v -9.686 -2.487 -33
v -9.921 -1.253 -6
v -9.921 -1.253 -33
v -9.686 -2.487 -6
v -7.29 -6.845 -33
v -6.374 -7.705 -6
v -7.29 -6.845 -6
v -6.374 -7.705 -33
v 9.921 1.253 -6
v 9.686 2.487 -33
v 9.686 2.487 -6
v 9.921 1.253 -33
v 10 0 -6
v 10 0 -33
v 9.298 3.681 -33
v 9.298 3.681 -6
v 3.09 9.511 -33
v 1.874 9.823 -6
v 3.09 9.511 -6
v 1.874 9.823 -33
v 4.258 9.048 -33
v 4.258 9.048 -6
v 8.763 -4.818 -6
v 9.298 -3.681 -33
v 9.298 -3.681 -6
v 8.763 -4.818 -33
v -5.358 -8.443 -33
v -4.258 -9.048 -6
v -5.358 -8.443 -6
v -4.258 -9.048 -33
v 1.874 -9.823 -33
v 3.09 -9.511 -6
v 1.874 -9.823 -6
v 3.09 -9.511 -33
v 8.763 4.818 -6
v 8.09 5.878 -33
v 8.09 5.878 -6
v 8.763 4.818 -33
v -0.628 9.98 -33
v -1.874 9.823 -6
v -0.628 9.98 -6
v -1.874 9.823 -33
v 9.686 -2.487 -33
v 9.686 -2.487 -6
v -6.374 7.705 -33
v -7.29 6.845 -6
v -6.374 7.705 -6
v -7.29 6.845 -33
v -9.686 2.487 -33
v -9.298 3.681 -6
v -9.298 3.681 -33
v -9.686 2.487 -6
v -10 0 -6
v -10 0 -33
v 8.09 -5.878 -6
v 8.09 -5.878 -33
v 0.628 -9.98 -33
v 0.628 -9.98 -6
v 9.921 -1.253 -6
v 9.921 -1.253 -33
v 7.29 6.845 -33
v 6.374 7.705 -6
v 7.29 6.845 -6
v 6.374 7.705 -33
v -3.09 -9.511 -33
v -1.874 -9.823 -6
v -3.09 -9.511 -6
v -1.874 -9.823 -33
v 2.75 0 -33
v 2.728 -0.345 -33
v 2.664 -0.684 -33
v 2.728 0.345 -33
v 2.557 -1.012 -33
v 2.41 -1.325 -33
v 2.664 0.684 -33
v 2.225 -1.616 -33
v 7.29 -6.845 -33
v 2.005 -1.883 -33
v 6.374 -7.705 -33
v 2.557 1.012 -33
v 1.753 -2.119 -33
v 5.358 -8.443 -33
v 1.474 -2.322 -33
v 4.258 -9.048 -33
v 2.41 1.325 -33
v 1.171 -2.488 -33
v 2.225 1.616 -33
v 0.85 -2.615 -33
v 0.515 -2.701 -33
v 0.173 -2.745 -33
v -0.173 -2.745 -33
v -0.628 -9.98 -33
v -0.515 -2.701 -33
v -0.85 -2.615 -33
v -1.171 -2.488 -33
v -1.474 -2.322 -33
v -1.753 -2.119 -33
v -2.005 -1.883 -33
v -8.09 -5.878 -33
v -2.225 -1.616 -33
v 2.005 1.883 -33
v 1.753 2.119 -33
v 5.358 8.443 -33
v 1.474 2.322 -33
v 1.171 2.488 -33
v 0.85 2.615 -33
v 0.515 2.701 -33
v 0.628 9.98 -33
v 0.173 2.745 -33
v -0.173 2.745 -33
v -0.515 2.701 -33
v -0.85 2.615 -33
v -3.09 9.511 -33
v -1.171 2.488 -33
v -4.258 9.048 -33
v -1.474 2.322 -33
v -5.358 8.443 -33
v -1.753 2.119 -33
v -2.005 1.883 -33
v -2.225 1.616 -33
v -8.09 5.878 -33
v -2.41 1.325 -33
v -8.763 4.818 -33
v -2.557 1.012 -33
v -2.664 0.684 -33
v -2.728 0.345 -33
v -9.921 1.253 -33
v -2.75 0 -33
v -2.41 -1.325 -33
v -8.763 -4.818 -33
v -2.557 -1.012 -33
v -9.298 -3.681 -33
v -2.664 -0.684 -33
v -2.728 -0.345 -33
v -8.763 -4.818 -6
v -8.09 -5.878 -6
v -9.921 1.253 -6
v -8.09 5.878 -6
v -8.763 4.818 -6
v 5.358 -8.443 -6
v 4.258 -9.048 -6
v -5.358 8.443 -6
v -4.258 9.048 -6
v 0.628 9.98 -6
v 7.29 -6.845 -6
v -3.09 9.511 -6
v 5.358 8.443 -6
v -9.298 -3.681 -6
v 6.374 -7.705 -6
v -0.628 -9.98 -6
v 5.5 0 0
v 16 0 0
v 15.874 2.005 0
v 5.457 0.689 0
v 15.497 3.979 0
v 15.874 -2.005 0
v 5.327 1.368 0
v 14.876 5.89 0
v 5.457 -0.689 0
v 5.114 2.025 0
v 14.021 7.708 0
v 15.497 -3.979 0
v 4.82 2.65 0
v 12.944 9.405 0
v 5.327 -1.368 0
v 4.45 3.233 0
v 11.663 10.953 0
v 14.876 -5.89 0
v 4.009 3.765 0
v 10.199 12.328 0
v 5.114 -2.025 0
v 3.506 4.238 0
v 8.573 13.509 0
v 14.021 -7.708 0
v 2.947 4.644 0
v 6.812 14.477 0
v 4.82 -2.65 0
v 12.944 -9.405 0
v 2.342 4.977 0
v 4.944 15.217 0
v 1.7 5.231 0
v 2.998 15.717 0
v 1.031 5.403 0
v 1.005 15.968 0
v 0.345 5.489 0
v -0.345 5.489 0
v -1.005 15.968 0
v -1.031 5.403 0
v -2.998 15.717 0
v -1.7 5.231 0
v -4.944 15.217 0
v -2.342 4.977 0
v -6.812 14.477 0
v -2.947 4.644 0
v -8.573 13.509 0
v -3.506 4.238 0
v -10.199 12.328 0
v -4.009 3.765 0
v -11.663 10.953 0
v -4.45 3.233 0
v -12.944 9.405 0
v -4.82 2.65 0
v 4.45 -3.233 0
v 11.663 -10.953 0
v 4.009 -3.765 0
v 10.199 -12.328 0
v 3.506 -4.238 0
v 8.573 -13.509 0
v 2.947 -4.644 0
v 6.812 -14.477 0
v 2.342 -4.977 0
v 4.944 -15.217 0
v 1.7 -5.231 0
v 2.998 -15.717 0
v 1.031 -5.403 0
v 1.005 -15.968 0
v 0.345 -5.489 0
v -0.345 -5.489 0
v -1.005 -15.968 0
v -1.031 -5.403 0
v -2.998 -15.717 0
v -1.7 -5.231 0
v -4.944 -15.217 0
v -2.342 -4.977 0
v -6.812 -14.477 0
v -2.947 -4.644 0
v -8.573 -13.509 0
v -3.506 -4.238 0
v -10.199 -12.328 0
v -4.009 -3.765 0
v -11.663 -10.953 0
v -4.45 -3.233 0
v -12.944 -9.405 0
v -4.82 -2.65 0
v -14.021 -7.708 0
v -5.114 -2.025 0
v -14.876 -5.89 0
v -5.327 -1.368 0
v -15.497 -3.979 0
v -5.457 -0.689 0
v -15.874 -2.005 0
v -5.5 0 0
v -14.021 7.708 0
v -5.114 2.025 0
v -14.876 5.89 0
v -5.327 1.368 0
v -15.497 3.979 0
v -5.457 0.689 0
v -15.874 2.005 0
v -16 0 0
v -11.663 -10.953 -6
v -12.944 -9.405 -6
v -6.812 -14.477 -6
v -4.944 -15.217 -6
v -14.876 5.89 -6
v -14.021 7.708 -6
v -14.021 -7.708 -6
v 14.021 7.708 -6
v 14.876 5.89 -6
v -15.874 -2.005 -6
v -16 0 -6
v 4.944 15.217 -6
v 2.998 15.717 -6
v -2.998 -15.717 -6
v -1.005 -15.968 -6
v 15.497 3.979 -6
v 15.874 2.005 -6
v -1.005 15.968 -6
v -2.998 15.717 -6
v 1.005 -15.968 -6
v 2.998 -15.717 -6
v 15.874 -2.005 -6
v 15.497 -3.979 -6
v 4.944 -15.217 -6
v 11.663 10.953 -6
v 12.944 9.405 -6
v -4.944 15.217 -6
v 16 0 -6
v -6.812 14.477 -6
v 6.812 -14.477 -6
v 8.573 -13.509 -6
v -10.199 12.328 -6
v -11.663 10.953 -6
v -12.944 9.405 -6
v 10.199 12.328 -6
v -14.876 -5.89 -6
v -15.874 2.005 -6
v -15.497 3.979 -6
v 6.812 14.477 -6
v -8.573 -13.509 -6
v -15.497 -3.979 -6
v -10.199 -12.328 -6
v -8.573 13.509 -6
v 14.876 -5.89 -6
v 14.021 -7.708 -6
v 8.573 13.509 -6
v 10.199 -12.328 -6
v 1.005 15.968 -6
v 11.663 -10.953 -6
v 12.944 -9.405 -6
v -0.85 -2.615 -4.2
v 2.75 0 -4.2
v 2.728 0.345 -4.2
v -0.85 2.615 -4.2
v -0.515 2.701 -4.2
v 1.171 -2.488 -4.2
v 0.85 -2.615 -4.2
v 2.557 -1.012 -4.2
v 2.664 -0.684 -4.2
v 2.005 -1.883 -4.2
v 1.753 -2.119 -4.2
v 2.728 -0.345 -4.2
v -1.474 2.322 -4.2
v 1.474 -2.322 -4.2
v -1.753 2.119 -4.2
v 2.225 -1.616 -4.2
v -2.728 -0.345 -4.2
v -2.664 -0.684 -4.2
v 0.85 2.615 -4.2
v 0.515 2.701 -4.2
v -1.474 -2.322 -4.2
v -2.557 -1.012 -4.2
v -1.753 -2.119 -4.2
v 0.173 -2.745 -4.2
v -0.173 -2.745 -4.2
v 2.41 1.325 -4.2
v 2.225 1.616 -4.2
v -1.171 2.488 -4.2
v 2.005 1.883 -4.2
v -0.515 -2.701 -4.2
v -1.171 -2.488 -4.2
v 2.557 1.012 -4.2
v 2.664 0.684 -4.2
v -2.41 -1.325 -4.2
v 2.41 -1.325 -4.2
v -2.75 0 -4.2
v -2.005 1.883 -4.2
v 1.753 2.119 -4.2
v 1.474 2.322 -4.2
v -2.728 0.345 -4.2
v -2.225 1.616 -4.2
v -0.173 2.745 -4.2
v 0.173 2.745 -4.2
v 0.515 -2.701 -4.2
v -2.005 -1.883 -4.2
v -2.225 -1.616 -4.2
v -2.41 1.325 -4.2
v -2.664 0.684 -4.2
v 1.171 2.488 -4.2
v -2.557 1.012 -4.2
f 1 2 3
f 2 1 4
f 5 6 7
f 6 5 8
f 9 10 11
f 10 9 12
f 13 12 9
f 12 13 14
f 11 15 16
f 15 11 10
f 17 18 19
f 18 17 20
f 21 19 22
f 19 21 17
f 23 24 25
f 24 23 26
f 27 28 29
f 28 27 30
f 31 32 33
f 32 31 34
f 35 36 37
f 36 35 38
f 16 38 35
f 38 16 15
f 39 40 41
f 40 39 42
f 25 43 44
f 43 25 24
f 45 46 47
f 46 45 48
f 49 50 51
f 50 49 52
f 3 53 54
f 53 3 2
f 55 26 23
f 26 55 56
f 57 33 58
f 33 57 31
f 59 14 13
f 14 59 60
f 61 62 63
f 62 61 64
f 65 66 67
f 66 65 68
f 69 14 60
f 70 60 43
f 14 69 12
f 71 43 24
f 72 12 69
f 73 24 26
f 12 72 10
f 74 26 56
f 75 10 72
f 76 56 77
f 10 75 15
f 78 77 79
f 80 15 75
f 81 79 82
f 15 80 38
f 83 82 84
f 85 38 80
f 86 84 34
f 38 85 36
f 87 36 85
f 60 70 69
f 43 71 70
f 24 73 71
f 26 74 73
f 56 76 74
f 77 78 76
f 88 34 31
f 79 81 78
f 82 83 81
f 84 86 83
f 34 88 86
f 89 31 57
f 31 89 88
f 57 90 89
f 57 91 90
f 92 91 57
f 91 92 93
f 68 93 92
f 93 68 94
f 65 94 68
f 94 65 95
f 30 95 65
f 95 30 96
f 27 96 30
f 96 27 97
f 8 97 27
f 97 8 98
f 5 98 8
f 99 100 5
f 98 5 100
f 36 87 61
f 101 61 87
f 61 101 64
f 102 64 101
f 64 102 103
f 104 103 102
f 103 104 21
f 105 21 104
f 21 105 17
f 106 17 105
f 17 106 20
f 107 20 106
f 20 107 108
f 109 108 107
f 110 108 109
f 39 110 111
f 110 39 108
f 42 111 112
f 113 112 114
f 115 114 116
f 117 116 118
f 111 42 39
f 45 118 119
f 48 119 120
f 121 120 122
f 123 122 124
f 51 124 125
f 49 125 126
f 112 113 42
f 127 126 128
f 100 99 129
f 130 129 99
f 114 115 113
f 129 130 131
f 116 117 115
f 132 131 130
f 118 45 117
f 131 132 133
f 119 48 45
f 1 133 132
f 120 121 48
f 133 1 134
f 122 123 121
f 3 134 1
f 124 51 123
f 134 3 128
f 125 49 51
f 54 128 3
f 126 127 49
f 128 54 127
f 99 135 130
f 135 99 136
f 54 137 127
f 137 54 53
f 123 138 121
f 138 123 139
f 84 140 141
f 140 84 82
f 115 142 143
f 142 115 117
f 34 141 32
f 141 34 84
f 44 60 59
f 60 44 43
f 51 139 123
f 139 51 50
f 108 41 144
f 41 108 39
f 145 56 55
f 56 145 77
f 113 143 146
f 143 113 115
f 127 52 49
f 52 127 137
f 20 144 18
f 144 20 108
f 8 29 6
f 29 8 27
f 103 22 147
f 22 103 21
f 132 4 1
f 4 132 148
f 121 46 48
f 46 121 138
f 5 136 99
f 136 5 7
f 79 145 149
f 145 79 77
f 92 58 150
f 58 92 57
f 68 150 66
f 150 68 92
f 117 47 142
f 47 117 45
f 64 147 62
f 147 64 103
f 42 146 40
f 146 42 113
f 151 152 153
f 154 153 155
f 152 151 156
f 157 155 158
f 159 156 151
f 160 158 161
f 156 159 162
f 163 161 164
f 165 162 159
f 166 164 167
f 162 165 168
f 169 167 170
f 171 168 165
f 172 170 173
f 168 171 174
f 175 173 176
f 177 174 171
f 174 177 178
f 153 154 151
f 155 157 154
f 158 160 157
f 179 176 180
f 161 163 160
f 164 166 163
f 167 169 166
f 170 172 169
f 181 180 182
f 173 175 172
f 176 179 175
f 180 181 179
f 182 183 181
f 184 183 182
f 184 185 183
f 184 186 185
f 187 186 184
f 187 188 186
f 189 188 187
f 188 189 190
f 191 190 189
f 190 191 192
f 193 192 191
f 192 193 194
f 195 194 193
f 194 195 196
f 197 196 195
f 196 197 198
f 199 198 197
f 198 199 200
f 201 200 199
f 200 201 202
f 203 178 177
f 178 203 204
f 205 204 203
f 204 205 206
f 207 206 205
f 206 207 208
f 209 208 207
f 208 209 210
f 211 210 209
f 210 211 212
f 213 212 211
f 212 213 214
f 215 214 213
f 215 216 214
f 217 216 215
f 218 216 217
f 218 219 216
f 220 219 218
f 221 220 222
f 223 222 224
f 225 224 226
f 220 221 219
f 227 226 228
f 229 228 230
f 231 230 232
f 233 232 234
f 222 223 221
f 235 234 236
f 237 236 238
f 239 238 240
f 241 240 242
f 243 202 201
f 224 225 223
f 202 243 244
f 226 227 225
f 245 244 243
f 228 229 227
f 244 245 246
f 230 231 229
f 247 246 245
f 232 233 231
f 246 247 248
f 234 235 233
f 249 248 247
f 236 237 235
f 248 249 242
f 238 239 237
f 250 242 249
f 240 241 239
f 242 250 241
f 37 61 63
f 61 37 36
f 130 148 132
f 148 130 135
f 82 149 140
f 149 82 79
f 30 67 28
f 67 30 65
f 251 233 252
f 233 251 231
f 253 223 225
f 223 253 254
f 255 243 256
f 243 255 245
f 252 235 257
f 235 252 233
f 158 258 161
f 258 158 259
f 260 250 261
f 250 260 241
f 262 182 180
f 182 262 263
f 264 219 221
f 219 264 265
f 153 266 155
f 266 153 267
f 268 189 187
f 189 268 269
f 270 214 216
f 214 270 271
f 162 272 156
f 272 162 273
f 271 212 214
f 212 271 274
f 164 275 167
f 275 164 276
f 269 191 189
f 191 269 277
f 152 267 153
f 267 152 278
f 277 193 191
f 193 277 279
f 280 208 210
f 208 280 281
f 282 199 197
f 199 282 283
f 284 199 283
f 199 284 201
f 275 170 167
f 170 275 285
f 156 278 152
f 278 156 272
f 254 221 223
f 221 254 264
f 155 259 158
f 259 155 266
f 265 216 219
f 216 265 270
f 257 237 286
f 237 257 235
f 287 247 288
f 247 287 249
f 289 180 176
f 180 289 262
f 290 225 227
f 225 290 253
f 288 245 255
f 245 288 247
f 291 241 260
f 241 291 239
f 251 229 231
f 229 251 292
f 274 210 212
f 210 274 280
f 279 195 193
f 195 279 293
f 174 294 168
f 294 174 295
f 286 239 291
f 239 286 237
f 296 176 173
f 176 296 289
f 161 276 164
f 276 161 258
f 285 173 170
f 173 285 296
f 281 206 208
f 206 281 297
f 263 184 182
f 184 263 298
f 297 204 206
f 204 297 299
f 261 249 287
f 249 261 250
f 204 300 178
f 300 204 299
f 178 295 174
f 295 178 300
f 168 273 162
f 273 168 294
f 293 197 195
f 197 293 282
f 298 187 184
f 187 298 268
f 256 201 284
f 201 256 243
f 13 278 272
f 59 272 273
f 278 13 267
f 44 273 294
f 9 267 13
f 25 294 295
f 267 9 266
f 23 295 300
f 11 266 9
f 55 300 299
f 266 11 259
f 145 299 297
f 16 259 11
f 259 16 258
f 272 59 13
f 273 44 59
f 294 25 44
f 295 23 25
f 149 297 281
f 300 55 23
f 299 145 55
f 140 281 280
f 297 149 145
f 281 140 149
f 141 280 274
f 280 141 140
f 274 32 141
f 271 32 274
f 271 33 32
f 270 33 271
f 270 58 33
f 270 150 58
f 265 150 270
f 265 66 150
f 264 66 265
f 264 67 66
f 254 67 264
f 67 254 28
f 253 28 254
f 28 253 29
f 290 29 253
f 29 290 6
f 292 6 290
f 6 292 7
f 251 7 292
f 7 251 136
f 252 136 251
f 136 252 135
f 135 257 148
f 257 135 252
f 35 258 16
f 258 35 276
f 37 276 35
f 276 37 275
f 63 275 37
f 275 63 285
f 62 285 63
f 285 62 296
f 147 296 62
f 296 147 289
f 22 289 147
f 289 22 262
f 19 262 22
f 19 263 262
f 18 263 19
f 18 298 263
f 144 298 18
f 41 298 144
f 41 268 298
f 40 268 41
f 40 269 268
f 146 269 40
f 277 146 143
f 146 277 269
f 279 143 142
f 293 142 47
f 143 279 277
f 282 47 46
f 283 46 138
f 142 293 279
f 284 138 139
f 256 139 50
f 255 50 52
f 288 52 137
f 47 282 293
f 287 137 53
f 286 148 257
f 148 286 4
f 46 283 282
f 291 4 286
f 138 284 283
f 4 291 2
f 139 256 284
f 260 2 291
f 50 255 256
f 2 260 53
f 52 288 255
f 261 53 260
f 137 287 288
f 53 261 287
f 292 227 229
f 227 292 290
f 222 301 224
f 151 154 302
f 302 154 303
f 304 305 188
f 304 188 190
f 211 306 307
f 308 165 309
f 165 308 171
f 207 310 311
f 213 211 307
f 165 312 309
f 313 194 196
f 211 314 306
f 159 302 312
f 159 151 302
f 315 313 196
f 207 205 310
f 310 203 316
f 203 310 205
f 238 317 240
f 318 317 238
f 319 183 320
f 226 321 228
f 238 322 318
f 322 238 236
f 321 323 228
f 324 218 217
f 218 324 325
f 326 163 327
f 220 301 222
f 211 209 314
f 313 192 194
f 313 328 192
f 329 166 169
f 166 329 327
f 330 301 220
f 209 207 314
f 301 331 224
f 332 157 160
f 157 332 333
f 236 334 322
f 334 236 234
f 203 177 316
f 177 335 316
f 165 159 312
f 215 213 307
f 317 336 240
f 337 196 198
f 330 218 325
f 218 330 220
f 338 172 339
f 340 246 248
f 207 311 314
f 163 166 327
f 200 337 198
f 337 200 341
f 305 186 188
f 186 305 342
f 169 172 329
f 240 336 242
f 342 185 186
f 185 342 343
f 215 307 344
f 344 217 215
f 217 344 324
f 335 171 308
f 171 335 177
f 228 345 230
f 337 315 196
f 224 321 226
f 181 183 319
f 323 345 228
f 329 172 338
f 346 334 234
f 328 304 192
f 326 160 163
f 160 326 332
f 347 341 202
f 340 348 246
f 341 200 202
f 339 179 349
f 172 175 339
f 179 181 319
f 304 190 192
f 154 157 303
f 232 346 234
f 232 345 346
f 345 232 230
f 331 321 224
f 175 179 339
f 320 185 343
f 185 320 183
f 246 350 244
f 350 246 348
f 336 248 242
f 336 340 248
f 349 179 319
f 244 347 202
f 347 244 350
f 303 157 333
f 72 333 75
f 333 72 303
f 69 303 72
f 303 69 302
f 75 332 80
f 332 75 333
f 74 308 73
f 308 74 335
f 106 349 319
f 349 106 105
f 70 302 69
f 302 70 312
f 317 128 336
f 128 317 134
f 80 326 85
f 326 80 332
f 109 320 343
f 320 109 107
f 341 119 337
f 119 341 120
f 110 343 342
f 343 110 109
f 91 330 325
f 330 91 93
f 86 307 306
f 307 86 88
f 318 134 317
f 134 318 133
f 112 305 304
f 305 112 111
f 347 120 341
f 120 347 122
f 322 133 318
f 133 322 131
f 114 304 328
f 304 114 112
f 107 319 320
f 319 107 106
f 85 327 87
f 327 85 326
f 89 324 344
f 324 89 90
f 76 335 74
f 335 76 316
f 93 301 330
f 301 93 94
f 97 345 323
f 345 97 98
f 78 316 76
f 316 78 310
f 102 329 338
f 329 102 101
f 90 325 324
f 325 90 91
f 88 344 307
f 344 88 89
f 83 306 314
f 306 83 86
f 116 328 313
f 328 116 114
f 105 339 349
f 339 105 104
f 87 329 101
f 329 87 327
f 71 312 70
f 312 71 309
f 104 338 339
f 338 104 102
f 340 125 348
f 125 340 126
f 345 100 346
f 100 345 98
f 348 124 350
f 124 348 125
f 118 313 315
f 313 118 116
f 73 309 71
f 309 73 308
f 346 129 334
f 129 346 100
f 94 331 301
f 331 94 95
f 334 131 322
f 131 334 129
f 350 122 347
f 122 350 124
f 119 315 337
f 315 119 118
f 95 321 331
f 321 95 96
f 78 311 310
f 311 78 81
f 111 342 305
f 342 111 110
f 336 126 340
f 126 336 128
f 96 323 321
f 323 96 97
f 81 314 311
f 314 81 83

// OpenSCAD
$fn = 50;


difference() {
	union() {
		translate(v = [0, 0, -33.0000000000]) {
			cylinder(h = 33, r = 10.0000000000);
		}
		translate(v = [0, 0, -6.0000000000]) {
			cylinder(h = 6, r = 16.0000000000);
		}
	}
	union() {
		translate(v = [0, 0, 0]) {
			rotate(a = [0, 0, 0]) {
				difference() {
					union() {
						#translate(v = [0, 0, -33.0000000000]) {
							cylinder(h = 33, r = 2.2500000000);
						}
						#translate(v = [0, 0, -4.2000000000]) {
							cylinder(h = 4.2000000000, r1 = 2.7500000000, r2 = 5.5000000000);
						}
						#translate(v = [0, 0, -33.0000000000]) {
							cylinder(h = 33, r = 2.7500000000);
						}
						#translate(v = [0, 0, -33.0000000000]) {
							cylinder(h = 33, r = 2.2500000000);
						}
					}
					union();
				}
			}
		}
	}
}
